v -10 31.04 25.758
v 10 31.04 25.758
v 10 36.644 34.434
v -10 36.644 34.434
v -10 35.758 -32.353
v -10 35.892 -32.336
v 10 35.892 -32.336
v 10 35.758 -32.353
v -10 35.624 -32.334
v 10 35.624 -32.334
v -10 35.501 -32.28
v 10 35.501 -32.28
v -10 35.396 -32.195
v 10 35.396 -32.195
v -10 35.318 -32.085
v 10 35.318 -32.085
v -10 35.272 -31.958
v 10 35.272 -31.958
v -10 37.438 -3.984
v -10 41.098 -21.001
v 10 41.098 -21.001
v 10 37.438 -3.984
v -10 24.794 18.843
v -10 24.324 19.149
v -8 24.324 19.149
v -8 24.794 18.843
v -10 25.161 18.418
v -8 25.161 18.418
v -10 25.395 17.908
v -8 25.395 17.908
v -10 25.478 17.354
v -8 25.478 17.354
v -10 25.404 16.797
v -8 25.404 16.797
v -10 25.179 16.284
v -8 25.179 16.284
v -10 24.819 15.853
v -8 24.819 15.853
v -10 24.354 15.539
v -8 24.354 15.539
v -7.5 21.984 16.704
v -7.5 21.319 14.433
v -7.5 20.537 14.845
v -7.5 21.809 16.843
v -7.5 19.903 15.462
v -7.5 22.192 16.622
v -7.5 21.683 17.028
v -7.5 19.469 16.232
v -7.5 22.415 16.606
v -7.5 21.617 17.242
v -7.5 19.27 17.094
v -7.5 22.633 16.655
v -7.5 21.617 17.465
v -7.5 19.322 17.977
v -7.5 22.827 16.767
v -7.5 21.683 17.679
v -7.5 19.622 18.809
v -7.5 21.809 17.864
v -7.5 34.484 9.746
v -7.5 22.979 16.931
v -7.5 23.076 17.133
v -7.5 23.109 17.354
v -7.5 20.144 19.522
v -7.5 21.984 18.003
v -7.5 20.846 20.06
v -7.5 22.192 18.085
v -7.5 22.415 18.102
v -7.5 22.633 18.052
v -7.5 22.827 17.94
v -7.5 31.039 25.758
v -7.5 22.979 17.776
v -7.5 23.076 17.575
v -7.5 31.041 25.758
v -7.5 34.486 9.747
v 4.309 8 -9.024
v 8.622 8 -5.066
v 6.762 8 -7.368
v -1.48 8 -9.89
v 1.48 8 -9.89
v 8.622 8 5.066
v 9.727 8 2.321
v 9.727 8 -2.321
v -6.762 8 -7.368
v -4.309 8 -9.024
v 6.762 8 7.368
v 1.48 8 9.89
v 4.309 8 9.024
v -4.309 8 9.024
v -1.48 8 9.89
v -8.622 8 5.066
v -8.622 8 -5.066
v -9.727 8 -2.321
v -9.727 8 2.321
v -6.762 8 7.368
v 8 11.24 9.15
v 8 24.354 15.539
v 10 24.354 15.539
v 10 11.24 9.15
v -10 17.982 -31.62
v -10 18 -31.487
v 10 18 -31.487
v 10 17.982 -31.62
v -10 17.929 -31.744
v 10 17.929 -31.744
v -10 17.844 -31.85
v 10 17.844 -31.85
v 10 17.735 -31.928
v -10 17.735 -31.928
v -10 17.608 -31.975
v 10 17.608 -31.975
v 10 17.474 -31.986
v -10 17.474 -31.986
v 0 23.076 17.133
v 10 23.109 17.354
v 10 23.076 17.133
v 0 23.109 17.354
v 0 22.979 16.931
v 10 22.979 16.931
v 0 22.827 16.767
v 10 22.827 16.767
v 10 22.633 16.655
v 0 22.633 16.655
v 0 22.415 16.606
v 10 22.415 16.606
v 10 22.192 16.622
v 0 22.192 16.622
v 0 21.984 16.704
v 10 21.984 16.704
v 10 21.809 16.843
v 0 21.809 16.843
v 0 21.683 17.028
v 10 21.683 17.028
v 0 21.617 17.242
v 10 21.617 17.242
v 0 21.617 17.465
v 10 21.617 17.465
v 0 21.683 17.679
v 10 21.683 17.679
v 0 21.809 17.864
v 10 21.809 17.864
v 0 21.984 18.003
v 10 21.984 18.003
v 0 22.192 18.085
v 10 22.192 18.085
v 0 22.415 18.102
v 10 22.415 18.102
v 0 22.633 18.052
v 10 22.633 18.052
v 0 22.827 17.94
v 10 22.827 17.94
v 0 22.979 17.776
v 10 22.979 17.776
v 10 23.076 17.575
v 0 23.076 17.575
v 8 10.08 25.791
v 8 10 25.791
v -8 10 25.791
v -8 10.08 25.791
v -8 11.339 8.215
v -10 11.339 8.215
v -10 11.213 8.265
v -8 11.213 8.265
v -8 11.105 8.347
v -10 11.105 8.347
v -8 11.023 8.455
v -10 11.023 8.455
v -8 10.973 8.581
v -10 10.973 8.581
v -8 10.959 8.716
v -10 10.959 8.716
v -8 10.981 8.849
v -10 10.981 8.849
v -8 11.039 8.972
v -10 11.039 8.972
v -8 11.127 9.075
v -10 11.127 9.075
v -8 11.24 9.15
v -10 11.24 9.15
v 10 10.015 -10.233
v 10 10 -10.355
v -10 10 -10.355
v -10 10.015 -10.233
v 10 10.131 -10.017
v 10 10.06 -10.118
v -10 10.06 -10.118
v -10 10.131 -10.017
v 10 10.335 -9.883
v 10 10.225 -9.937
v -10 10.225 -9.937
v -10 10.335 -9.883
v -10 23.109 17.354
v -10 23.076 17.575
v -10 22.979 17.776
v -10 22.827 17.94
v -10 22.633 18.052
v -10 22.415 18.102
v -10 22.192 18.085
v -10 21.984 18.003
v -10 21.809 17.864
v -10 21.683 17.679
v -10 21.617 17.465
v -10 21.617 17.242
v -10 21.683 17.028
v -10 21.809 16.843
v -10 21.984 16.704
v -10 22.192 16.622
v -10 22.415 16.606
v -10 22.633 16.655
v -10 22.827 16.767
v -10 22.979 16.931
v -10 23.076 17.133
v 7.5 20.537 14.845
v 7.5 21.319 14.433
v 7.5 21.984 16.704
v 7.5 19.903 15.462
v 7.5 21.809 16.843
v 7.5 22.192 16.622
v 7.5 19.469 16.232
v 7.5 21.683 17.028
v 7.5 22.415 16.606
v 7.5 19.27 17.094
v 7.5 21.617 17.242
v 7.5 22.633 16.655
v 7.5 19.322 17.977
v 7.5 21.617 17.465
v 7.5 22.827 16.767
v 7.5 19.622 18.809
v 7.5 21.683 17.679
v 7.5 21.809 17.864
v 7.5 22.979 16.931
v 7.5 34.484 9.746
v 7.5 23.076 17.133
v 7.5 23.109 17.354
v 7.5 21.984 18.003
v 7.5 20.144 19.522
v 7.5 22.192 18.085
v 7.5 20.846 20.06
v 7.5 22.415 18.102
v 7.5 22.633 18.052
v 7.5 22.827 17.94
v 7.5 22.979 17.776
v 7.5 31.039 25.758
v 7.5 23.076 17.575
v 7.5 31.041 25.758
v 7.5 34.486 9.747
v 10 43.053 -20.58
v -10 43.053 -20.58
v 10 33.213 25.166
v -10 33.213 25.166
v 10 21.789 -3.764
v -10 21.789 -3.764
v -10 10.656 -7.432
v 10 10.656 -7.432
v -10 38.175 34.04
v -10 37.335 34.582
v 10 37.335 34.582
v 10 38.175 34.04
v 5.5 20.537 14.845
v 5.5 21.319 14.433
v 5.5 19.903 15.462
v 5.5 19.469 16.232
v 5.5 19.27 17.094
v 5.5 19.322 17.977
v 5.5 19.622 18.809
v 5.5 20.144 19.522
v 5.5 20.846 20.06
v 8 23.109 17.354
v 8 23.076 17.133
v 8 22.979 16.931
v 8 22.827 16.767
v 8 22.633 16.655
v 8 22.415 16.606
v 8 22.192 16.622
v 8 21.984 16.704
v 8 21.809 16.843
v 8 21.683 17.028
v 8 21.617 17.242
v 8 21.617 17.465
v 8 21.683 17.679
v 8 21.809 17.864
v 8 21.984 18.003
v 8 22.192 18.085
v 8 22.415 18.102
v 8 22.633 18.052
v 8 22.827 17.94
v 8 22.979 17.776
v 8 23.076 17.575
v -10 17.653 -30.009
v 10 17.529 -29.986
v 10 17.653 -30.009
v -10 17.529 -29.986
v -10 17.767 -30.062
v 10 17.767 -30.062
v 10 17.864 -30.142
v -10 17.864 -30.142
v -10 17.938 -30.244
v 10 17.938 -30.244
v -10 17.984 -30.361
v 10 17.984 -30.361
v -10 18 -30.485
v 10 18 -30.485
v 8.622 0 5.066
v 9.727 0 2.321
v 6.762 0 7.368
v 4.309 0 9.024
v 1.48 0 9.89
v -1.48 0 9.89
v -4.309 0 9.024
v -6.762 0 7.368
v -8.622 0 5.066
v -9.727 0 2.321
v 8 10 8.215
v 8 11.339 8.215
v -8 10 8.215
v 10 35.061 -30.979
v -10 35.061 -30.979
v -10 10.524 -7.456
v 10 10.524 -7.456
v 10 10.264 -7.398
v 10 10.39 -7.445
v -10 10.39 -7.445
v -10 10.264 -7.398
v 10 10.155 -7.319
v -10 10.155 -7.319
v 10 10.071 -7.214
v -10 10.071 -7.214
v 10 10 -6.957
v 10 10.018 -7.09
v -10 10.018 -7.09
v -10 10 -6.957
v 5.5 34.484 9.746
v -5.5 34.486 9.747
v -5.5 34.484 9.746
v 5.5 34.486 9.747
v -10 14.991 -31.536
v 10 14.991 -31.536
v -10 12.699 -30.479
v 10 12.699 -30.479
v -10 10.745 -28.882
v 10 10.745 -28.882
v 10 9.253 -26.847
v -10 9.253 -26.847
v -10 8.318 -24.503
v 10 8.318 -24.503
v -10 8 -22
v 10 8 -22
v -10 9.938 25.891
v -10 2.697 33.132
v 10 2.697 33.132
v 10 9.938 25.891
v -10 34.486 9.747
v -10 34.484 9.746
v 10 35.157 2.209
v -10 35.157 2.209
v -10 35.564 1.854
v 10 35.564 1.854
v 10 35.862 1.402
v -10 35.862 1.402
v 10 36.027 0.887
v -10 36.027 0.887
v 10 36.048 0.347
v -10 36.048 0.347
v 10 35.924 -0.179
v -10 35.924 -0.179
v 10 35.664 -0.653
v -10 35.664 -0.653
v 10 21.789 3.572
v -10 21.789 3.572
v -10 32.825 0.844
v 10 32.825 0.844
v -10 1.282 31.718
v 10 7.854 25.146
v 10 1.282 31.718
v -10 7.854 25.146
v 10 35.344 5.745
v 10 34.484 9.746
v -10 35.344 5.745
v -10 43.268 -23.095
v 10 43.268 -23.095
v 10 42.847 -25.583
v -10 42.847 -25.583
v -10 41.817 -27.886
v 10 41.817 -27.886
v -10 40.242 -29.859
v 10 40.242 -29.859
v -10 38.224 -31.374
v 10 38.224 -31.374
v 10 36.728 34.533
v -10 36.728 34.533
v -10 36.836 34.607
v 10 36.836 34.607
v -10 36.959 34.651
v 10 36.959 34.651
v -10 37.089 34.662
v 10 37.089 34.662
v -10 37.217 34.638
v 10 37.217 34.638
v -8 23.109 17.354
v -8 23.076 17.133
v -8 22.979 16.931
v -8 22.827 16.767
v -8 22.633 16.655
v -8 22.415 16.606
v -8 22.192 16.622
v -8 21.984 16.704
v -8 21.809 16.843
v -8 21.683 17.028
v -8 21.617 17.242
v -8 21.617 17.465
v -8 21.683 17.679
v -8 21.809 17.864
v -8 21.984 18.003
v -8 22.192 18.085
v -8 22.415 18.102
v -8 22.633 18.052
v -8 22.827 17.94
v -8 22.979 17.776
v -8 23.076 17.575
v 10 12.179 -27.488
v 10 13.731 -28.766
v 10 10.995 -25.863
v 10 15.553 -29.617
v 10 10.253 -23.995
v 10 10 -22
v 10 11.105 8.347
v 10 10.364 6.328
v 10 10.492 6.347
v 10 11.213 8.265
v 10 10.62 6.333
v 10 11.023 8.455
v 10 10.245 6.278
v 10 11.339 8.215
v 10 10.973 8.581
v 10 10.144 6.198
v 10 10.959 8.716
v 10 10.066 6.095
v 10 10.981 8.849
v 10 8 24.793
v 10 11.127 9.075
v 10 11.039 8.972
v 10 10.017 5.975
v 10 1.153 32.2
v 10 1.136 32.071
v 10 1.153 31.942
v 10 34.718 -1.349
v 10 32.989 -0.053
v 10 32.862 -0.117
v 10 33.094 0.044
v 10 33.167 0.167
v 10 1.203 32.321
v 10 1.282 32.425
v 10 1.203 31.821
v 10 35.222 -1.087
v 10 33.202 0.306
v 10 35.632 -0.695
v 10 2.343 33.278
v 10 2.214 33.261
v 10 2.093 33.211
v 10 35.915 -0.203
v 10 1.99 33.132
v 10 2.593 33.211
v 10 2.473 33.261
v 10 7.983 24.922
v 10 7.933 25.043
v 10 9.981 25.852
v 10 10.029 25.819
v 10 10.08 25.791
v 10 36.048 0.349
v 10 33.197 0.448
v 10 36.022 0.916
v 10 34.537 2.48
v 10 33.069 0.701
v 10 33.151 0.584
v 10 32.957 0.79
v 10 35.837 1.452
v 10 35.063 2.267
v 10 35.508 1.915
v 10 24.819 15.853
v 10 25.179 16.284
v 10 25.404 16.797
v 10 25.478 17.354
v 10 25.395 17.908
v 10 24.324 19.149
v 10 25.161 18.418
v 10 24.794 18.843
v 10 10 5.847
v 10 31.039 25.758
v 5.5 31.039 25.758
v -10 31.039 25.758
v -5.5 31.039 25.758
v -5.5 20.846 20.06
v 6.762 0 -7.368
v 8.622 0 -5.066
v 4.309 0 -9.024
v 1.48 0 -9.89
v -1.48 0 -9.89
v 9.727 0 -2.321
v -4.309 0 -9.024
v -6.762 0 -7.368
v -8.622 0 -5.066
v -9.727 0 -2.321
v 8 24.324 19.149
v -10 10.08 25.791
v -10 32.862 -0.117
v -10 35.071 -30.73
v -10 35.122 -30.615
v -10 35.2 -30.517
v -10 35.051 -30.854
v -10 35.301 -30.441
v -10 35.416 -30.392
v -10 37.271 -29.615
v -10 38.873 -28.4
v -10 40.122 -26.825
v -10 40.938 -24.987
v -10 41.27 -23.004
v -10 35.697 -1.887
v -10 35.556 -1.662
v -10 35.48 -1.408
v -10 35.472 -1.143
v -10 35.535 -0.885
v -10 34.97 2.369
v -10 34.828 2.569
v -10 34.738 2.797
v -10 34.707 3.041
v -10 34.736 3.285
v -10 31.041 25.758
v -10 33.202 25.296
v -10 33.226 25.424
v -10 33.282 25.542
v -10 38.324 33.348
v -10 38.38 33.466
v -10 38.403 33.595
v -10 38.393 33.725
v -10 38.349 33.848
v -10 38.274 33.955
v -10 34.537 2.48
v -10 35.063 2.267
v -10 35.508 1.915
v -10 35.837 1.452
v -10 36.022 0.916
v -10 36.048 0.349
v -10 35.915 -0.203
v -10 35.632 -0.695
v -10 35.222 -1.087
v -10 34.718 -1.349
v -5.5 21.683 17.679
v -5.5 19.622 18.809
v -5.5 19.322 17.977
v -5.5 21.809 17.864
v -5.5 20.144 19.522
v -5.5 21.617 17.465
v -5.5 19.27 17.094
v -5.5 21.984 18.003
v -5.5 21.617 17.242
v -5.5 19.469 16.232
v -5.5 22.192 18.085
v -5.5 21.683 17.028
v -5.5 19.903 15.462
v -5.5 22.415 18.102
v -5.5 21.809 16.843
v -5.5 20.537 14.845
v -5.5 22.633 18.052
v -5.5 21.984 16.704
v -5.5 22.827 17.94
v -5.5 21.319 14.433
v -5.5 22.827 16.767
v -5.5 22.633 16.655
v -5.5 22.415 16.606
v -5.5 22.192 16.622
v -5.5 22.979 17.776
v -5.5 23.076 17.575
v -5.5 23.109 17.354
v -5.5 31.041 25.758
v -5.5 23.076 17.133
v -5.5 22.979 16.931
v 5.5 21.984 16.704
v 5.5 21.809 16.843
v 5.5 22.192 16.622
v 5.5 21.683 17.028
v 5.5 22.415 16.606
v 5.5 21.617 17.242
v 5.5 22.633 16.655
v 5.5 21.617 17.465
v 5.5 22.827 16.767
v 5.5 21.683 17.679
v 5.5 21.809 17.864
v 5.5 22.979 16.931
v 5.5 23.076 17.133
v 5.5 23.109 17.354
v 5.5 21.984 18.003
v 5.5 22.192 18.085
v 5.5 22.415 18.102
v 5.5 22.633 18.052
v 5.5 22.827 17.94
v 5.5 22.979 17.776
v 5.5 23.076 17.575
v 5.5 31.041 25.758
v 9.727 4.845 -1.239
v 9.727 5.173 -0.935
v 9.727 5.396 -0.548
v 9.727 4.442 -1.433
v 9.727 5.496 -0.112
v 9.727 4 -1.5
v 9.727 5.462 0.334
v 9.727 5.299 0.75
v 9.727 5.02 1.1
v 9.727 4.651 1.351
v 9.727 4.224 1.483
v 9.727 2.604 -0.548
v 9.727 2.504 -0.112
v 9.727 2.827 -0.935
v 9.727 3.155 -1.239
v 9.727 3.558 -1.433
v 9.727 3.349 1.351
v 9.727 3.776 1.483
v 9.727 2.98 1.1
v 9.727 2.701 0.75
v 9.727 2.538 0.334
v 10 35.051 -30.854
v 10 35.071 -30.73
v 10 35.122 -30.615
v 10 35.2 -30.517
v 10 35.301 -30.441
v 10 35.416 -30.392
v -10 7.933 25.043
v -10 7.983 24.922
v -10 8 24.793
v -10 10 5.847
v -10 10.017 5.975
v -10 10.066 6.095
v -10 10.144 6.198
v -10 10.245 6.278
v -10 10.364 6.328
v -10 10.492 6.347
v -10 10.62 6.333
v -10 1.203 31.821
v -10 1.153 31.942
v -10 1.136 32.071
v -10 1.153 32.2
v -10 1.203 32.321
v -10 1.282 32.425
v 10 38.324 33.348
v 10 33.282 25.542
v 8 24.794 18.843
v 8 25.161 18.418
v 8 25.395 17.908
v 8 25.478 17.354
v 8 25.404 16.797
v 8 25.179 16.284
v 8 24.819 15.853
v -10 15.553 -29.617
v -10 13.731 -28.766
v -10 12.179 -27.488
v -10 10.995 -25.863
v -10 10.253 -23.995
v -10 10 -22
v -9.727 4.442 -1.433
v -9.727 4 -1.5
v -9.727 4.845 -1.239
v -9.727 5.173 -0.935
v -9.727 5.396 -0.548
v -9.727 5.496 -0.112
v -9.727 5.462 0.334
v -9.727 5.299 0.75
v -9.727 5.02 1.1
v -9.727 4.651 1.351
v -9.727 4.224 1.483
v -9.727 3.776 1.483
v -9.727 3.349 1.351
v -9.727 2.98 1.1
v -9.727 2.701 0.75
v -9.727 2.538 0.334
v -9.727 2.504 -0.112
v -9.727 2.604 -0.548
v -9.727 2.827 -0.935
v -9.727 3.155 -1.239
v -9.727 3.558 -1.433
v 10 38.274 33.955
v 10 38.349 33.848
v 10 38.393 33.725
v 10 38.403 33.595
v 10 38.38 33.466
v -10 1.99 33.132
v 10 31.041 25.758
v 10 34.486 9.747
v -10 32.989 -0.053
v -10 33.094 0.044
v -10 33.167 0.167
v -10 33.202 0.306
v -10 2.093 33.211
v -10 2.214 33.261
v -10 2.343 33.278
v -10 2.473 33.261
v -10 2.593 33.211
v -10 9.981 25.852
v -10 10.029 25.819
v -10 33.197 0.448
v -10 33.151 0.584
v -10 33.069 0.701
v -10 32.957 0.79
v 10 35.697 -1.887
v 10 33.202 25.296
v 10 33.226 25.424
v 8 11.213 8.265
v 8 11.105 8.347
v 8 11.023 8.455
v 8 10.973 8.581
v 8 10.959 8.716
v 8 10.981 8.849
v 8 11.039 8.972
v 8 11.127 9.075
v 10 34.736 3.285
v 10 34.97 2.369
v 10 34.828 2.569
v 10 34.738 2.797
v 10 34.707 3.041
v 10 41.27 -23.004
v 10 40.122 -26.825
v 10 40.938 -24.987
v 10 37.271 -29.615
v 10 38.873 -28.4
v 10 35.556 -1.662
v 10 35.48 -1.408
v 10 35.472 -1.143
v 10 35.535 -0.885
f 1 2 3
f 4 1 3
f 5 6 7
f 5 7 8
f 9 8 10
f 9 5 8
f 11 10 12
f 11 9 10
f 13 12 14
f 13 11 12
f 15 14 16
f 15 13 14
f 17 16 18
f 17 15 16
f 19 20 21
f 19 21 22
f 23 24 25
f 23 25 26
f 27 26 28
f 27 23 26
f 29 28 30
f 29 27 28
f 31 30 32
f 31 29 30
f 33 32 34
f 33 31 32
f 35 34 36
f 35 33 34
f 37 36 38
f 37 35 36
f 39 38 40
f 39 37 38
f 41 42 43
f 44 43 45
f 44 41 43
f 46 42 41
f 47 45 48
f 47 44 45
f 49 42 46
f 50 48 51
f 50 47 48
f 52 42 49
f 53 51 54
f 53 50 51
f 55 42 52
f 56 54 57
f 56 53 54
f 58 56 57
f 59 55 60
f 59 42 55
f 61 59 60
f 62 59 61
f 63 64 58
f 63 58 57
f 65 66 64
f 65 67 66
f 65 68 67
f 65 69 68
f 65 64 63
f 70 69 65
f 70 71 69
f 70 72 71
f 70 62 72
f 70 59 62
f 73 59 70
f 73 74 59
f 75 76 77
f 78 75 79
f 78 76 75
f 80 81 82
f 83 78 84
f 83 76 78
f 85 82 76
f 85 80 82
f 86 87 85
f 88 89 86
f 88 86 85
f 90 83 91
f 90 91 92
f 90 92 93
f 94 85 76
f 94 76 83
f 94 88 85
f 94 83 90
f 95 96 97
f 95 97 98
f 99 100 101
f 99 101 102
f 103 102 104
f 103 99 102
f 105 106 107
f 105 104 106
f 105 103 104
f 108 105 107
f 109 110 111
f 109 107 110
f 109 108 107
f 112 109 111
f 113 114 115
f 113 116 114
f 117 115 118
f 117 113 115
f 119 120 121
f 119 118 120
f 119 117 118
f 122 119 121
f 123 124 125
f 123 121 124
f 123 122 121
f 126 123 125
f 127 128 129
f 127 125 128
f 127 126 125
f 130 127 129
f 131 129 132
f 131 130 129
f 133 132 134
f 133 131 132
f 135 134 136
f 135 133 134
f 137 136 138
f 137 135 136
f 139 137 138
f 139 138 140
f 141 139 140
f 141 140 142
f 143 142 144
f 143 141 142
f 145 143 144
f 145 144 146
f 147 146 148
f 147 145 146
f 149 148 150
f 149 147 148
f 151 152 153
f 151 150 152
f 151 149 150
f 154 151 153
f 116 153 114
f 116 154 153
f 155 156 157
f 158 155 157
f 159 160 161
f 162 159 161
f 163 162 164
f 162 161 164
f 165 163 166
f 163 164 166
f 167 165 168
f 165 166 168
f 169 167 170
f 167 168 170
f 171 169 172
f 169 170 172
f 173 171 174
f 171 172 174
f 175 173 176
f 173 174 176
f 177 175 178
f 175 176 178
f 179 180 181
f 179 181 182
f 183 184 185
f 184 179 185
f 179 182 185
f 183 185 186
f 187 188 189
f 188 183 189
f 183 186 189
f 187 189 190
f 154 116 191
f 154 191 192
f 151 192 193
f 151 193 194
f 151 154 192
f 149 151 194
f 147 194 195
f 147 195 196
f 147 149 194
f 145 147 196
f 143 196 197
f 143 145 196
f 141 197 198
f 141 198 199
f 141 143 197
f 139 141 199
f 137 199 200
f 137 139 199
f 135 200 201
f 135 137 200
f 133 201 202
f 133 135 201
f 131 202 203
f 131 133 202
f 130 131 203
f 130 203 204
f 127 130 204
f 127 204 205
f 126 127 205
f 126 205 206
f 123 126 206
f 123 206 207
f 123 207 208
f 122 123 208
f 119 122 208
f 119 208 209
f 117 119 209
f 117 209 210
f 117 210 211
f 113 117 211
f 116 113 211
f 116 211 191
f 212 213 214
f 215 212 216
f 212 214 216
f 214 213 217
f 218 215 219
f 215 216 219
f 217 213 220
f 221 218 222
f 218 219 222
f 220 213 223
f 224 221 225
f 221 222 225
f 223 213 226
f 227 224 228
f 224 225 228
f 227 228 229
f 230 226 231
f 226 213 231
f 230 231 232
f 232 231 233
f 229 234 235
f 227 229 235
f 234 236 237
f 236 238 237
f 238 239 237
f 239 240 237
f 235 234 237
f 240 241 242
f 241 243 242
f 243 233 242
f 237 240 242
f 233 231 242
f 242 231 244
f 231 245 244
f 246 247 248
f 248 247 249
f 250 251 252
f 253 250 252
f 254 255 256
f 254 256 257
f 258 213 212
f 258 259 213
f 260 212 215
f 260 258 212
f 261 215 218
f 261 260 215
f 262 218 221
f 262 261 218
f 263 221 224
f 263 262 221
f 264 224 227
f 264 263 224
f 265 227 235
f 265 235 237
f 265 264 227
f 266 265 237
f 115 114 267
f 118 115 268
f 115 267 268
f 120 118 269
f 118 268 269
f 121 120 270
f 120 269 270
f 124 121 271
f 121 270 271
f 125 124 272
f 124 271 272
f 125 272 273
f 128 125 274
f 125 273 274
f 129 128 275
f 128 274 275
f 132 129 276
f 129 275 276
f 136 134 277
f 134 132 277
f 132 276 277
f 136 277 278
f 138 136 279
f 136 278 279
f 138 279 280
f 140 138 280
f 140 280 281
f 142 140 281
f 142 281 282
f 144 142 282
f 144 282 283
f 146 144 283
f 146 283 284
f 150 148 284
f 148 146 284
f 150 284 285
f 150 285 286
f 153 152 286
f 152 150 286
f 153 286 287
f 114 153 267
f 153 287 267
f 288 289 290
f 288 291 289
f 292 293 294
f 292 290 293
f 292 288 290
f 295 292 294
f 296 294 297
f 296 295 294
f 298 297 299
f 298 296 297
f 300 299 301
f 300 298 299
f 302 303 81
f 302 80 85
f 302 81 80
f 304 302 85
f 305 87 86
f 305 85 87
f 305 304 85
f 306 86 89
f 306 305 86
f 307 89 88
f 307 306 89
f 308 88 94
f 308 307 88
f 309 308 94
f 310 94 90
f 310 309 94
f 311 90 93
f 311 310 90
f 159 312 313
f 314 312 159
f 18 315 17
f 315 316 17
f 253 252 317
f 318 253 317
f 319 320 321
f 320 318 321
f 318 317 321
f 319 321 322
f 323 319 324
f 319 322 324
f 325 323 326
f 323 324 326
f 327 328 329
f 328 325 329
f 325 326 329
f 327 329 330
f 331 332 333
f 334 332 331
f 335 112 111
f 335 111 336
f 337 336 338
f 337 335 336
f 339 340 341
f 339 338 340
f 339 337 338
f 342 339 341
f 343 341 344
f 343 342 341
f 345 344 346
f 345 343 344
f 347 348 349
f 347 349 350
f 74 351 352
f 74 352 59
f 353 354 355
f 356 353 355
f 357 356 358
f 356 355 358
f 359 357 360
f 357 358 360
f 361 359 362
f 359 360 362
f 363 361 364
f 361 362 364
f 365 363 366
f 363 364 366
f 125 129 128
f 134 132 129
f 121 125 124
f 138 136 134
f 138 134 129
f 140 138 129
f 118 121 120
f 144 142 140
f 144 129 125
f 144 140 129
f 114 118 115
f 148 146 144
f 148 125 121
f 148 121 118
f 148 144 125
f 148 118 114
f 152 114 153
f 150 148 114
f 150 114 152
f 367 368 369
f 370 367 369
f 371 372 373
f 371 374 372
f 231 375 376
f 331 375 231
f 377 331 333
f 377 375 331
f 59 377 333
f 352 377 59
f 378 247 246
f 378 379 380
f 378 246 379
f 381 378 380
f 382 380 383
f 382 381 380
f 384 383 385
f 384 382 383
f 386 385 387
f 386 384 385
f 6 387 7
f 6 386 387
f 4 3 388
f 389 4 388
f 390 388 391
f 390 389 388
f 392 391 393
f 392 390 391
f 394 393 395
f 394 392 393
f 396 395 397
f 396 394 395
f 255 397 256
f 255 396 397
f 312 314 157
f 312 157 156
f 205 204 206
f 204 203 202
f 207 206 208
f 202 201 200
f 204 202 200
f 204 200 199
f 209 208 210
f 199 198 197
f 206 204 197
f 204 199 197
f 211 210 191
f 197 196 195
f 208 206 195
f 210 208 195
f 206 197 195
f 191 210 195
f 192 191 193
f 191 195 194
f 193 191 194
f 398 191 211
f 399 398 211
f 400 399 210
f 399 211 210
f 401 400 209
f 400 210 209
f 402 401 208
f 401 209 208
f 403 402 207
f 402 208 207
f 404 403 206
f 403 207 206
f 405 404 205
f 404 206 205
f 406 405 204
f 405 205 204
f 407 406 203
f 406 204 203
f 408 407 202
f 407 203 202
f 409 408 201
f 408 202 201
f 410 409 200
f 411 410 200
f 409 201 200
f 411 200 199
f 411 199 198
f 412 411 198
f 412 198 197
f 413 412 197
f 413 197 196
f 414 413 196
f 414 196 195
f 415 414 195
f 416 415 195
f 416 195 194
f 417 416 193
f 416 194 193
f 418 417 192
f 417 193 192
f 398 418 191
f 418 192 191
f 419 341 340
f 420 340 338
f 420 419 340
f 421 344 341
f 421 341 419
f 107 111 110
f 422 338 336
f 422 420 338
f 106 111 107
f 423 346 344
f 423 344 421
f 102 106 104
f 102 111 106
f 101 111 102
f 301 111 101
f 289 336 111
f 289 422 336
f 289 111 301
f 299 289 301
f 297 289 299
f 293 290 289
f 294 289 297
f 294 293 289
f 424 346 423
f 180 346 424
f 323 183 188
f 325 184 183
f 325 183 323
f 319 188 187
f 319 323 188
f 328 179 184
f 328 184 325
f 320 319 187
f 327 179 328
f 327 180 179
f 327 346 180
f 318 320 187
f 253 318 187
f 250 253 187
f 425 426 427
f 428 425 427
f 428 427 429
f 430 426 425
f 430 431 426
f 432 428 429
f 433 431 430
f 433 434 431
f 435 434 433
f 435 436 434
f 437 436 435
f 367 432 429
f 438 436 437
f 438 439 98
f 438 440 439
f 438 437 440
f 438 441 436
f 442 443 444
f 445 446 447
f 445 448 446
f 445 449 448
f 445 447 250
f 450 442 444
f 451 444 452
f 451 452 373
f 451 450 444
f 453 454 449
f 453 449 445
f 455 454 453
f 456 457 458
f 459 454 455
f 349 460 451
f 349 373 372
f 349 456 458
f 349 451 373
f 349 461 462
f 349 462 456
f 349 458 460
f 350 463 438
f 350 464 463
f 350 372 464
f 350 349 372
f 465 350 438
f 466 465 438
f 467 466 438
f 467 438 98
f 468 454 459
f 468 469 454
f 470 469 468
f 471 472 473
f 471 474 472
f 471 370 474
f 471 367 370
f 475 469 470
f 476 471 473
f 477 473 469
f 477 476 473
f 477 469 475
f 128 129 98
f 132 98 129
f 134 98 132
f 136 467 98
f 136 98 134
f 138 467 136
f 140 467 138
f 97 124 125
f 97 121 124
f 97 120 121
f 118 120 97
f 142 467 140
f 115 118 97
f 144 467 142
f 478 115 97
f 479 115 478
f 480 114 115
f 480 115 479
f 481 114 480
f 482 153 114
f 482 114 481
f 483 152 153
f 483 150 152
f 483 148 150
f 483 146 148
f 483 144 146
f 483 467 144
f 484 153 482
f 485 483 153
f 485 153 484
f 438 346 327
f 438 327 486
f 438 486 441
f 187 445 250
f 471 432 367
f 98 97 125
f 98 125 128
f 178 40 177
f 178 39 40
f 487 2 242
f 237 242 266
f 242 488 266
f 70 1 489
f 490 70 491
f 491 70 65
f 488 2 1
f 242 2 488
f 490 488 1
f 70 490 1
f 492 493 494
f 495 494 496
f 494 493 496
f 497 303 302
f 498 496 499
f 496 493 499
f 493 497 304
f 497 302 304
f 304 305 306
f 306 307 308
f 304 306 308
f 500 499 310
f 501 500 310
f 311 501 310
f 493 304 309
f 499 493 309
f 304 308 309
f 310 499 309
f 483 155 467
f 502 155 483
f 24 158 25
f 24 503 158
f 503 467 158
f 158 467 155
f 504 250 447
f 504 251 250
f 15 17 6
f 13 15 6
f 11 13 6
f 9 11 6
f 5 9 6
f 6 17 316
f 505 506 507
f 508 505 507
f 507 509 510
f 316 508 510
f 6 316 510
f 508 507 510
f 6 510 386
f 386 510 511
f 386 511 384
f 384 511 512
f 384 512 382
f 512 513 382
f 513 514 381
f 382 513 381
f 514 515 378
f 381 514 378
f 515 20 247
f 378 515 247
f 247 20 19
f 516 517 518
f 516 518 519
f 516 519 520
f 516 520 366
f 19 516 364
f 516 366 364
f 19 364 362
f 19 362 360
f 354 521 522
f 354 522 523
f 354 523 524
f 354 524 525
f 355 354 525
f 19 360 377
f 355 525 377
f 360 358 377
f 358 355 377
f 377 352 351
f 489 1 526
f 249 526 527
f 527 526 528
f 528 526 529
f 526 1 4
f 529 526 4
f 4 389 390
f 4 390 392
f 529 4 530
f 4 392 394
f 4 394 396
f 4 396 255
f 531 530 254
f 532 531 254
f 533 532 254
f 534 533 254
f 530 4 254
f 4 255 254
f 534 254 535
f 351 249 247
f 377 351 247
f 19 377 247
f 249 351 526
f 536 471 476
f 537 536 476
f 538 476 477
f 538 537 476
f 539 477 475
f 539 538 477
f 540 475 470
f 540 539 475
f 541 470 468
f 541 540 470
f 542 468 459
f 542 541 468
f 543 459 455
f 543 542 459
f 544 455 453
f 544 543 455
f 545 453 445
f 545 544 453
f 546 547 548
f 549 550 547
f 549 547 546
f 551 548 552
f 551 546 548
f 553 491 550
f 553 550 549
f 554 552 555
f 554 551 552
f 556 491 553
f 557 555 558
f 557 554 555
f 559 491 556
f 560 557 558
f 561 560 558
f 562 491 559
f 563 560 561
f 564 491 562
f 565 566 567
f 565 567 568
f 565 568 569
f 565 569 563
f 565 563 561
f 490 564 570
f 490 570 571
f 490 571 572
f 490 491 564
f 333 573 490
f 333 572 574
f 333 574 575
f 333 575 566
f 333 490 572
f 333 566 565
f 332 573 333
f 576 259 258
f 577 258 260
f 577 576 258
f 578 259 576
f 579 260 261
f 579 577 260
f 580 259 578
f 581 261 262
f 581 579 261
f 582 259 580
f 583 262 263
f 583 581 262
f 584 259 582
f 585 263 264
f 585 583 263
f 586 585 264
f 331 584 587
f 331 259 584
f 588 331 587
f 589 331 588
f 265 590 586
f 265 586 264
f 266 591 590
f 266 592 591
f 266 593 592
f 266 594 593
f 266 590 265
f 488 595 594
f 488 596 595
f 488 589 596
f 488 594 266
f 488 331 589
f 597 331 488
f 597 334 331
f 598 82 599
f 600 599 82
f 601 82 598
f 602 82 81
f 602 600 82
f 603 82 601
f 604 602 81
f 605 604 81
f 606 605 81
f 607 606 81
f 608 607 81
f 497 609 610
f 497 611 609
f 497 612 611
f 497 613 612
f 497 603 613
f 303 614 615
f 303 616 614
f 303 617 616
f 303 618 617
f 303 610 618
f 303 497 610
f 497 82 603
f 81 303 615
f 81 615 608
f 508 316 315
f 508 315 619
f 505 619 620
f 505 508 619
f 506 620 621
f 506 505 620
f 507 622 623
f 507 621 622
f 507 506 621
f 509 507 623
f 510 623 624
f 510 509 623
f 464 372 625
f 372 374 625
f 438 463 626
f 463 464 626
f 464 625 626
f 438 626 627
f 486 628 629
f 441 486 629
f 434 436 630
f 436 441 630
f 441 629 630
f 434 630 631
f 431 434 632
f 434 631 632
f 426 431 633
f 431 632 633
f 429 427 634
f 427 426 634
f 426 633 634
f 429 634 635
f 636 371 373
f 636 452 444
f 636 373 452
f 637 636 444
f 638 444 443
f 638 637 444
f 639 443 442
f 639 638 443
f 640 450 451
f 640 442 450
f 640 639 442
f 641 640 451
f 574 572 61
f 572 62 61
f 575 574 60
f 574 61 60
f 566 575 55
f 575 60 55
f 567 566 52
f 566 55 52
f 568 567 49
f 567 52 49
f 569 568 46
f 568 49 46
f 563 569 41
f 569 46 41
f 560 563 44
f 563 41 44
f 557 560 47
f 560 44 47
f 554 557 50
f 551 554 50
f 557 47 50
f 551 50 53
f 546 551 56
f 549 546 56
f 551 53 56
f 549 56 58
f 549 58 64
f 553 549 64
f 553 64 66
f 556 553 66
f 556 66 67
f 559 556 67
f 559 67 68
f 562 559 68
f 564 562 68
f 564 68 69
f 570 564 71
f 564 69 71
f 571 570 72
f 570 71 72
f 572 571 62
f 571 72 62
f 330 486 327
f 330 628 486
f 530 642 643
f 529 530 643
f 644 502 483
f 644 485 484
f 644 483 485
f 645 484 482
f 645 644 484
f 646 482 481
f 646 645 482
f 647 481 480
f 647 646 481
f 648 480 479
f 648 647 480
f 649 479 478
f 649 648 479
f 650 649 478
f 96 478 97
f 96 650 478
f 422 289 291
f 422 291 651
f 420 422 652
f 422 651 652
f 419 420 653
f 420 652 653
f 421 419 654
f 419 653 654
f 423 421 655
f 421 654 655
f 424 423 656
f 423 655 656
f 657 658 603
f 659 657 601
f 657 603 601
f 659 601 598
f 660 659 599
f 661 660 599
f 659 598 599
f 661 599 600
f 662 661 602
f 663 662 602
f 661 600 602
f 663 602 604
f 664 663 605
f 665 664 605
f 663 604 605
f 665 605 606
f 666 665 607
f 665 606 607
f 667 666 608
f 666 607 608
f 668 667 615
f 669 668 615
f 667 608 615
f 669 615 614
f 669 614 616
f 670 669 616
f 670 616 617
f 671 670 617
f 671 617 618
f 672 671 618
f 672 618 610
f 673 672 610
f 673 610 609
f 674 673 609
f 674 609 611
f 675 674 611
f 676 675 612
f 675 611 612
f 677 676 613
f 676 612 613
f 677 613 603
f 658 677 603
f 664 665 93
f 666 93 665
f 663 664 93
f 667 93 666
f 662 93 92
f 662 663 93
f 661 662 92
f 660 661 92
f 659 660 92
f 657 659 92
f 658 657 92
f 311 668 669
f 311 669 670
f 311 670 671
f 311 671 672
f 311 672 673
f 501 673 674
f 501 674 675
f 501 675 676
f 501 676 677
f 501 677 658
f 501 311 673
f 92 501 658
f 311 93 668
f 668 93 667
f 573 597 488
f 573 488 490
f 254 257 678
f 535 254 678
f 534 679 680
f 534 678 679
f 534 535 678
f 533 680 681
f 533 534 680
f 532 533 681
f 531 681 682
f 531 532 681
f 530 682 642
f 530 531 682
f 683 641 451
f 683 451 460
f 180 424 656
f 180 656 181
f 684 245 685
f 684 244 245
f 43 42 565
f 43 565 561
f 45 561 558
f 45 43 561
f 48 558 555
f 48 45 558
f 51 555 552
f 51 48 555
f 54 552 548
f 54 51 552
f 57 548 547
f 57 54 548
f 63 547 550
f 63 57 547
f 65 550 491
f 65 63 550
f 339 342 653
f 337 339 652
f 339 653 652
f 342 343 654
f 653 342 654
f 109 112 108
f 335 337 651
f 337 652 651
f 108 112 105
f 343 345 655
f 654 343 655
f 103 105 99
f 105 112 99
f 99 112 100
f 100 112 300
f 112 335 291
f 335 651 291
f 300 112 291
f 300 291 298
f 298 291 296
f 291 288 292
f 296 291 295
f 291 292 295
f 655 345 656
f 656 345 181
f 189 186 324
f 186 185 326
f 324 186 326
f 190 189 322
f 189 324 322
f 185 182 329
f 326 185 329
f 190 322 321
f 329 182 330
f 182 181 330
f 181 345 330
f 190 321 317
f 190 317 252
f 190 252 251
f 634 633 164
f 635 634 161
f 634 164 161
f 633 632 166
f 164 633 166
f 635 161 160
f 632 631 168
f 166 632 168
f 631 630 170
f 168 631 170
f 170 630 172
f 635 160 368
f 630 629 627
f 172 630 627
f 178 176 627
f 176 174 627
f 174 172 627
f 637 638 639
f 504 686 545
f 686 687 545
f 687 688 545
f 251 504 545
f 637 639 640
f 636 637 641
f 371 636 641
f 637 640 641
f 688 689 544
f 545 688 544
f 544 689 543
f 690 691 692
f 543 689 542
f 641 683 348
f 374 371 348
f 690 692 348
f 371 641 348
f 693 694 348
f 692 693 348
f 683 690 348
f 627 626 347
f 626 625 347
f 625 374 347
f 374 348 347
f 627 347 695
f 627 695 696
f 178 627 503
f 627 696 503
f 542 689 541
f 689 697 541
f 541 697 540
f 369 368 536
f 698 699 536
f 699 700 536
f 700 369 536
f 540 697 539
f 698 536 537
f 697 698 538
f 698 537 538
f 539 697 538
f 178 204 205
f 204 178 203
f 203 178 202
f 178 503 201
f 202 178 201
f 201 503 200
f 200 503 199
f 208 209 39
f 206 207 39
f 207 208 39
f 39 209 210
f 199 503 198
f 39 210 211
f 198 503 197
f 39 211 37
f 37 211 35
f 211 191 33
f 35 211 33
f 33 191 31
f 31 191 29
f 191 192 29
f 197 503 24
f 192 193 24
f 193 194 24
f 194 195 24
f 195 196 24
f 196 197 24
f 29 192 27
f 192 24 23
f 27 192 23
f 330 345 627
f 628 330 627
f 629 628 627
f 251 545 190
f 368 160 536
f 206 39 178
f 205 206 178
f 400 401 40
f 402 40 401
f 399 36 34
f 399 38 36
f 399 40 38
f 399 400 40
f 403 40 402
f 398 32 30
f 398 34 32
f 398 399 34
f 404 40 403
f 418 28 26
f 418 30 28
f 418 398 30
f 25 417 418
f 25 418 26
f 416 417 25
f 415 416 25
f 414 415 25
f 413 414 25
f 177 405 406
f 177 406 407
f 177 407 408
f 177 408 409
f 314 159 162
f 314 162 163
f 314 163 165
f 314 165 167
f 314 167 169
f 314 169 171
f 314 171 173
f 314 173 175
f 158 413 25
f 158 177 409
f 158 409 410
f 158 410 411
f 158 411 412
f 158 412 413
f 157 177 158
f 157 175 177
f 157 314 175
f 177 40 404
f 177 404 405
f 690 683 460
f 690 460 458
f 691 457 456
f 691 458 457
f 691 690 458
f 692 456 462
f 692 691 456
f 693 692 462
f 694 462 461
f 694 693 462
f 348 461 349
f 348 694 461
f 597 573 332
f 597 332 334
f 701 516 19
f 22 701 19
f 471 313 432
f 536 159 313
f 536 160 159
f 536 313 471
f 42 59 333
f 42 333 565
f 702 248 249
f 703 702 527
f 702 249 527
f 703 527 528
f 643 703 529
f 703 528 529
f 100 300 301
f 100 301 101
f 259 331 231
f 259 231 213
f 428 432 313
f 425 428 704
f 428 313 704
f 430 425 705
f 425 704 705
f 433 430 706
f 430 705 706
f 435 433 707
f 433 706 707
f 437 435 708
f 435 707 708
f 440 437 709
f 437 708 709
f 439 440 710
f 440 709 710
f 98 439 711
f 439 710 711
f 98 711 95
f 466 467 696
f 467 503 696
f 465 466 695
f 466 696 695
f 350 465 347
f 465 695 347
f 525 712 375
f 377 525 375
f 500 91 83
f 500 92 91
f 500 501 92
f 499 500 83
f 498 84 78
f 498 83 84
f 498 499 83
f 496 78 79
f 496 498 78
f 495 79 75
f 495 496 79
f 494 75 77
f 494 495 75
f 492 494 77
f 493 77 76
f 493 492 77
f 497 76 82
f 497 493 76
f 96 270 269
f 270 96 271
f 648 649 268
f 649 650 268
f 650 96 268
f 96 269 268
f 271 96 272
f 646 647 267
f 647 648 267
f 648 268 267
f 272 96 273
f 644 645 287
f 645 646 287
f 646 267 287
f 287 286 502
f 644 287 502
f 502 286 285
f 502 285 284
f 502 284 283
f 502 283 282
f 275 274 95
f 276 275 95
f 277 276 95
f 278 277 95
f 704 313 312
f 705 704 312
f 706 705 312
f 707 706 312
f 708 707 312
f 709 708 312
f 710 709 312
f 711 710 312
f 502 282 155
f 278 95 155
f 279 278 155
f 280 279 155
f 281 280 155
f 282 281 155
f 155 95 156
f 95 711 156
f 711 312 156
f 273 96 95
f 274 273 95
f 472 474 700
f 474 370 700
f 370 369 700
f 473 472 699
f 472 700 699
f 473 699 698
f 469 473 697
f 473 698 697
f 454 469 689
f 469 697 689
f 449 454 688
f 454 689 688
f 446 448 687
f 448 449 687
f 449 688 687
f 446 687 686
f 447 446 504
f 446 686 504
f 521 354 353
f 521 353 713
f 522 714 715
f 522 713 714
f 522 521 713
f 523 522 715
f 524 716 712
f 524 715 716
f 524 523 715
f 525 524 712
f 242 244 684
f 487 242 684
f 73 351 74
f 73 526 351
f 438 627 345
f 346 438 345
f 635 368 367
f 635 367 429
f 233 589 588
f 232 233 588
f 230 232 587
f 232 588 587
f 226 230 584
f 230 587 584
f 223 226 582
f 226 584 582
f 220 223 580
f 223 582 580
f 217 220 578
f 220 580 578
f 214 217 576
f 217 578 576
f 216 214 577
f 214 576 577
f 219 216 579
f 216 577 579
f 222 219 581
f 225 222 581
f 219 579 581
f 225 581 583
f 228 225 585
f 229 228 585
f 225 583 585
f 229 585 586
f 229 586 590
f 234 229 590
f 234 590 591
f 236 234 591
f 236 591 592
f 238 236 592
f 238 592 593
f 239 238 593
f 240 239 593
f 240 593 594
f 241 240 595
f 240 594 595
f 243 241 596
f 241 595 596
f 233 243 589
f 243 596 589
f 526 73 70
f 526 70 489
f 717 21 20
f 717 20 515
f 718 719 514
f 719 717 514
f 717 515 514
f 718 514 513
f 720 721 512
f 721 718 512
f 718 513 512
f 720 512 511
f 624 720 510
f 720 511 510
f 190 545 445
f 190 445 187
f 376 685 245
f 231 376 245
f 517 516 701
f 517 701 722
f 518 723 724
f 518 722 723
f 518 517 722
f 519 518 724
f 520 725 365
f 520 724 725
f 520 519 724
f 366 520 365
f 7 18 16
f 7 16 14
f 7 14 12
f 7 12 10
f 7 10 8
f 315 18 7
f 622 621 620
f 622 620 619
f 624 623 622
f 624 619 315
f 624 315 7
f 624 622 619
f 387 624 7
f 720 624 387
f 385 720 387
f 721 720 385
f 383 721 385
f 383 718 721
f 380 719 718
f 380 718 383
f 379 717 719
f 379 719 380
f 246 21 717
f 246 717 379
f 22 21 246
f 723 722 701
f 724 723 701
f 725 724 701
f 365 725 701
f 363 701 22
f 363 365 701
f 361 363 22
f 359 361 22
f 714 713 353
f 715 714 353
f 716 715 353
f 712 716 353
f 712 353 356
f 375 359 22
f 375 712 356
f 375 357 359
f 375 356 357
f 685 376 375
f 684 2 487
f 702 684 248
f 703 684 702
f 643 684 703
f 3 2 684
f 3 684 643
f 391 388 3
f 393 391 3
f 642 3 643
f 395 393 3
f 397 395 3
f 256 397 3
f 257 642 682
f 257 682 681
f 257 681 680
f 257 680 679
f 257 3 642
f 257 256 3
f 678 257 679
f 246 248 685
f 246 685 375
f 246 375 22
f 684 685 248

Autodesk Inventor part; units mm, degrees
ref_plane "YZ Plane" through (0, 0, 0) normal (1, 0, 0) x (0, 1, 0)
ref_plane "XZ Plane" through (0, 0, 0) normal (0, 1, 0) x (-1, 0, 0)
ref_plane "XY Plane" through (0, 0, 0) normal (0, 0, 1) x (1, 0, 0)
sketch "Эскиз1" plane through (0, 0, 0) normal (1, 0, 0) x (0, 0, -1)
  line L0 (-5.1487, -13.4444) -> (-9.7487, -13.4444)
  line L1 (-9.7487, -13.4444) -> (-9.7487, -18.4444)
  line L2 (-9.7487, -18.4444) -> (7.2513, -18.4444)
  line L3 (7.2513, -18.4444) -> (7.2513, -13.4444)
  line L4 (7.2513, -13.4444) -> (2.6513, -13.4444)
  line L5 (2.6513, -13.4444) -> (2.6513, -8.4651)
  line L6 (2.6513, -8.4651) -> (7.2513, -8.4651)
  line L7 (7.2513, -8.4651) -> (7.2513, 21.5556)
  line L8 (7.2513, 21.5556) -> (-9.7487, 21.5556)
  line L9 (-9.7487, 21.5556) -> (-9.7487, -8.4237)
  line L10 (-9.7487, -8.4237) -> (-5.1487, -8.4237)
  line L11 (-5.1487, -8.4237) -> (-5.1487, -13.4444)
  circle A0 centre (-1.2487, 17.5556) radius 1
  dimension "d13" = 0.5
sketch "Эскиз2" plane through (0, 0, 0) normal (0, 1, 0) x (-1, 0, 0)
  line L0 (-9.727, -2.3208) -> (-9.727, 2.3208)
  line L1 (9.727, 2.3208) -> (9.727, -2.3208)
  arc A0 (9.727, 2.3208) -> (-9.727, 2.3208) centre (0, 0) ccw
  arc A1 (-9.727, -2.3208) -> (9.727, -2.3208) centre (0, 0) ccw
extrude "Выдавливание2" add sketch "Эскиз2" along normal blind 8
sketch "Эскиз3" plane through (0, 0, 0) normal (1, 0, 0) x (0, 1, 0)
  line L0 (7.8536, 25.1464) -> (1.2825, 31.7175)
  line L1 (1.2825, 32.4246) -> (1.9896, 33.1317)
  line L2 (2.6967, 33.1317) -> (9.9377, 25.8908)
  arc A0 (8, -22) -> (17.4737, -31.9861) centre (18, -22) ccw
  line L3 (8, 24.7929) -> (8, -22)
  line L4 (10, -22) -> (10, -10.3547)
  arc A1 (10, -22) -> (17.5294, -29.9861) centre (18, -22) ccw
  line L5 (18, -30.4853) -> (18, -31.4868)
  line L6 (10.0799, 25.7912) -> (24.3236, 19.1492)
  line L7 (24.3542, 15.5386) -> (11.2398, 9.1501)
  arc A2 (24.3542, 15.5386) -> (24.3236, 19.1492) centre (23.4783, 17.3366) ccw
  line L8 (11.3388, 8.2152) -> (34.5374, 2.4804)
  line L9 (34.7181, -1.3488) -> (10.3348, -9.8828)
  arc A3 (34.7181, -1.3488) -> (34.5374, 2.4804) centre (34.0574, 0.5389) ccw
  line L10 (21.7887, 3.5717) -> (32.825, 0.8435)
  line L11 (21.7887, 3.5717) -> (10.62, 6.3327)
  line L12 (21.7887, -3.7645) -> (10.6564, -7.4318)
  line L13 (21.7887, -3.7645) -> (32.8615, -0.1167)
  line L14 (10, 5.8473) -> (10, -6.957)
  arc A4 (32.8615, -0.1167) -> (32.825, 0.8435) centre (32.7051, 0.3582) ccw
  circle A5 centre (22.3591, 17.3536) radius 0.75
  arc A6 (1.2825, 32.4246) -> (1.2825, 31.7175) centre (1.636, 32.0711) ccw
  arc A7 (2.6967, 33.1317) -> (1.9896, 33.1317) centre (2.3431, 32.7782) ccw
  arc A8 (8, 24.7929) -> (7.8536, 25.1464) centre (7.5, 24.7929) ccw
  arc A9 (9.9377, 25.8908) -> (10.0799, 25.7912) centre (10.2912, 26.2443) ccw
  arc A10 (11.2398, 9.1501) -> (11.3388, 8.2152) centre (11.4588, 8.7006) ccw
  arc A11 (10.62, 6.3327) -> (10, 5.8473) centre (10.5, 5.8473) ccw
  arc A12 (10, -6.957) -> (10.6564, -7.4318) centre (10.5, -6.957) ccw
  arc A13 (10.3348, -9.8828) -> (10, -10.3547) centre (10.5, -10.3547) ccw
  arc A14 (18, -30.4853) -> (17.5294, -29.9861) centre (17.5, -30.4853) ccw
  arc A15 (17.4737, -31.9861) -> (18, -31.4868) centre (17.5, -31.4868) ccw
  point P0 (0, 0)
  point P1 (18, -32)
  point P2 (18, -30)
  dimension "d13" = 0.5
extrude "Выдавливание3" add sketch "Эскиз3" along normal mid plane 20 separate body
sketch "Эскиз4" plane through (-10, 10, -6.957) normal (0, 1, 0) x (1, 0, 0)
  line L0 (18, -32.7481) -> (2, -32.7481)
  line L1 (2, -15.1722) -> (2, -32.7481)
  line L2 (18, -15.1722) -> (18, -32.7481)
  line L3 (18, -15.1722) -> (2, -15.1722)
  point P0 (10, -6.957)
extrude "Выдавливание4" cut sketch "Эскиз4" along normal blind 20 bodies 1 2
sketch "Эскиз5" plane through (0, 0, 0) normal (1, 0, 0) x (0, 1, 0)
  arc A0 (35.6637, -0.6527) -> (35.1571, 2.2094) centre (34.0574, 0.5389) ccw
  arc A1 (35.4164, -30.3921) -> (41.098, -21.0011) centre (33.2769, -22.6835) ccw
  arc A2 (35.4164, -30.3921) -> (35.0614, -30.979) centre (35.5502, -30.8739) ccw
  line L0 (35.0614, -30.979) -> (35.272, -31.9582)
  arc A3 (35.272, -31.9582) -> (35.8915, -32.3356) centre (35.7608, -31.853) ccw
  arc A4 (35.8915, -32.3356) -> (43.0533, -20.5805) centre (33.2769, -22.6835) ccw
  arc A5 (33.2815, 25.5424) -> (33.2127, 25.166) centre (33.7015, 25.2711) ccw
  line L1 (38.3237, 33.3484) -> (33.2815, 25.5424)
  arc A6 (38.3237, 33.3484) -> (38.175, 34.0397) centre (37.9037, 33.6197) ccw
  line L2 (37.335, 34.5823) -> (38.175, 34.0397)
  arc A7 (37.335, 34.5823) -> (36.6437, 34.4336) centre (37.0637, 34.1623) ccw
  line L3 (31.0396, 25.7578) -> (36.6437, 34.4336)
  line L4 (43.0533, -20.5805) -> (33.2127, 25.166)
  arc A8 (20.8463, 20.0597) -> (21.3193, 14.4329) centre (22.3591, 17.3536) ccw
  line L5 (34.4838, 9.7464) -> (21.3193, 14.4329)
  line L6 (31.0396, 25.7578) -> (20.8463, 20.0597)
  line L7 (35.6973, -1.8871) -> (37.4375, -3.9843)
  line L8 (34.7362, 3.2847) -> (35.3445, 5.7454)
  line L9 (41.098, -21.0011) -> (37.4375, -3.9843)
  line L10 (35.3445, 5.7454) -> (34.4838, 9.7464)
  arc A9 (35.6637, -0.6527) -> (35.6973, -1.8871) centre (36.4668, -1.2485) ccw
  arc A10 (34.7362, 3.2847) -> (35.1571, 2.2094) centre (35.707, 3.0447) ccw
  circle A11 centre (22.3591, 17.3536) radius 0.75
extrude "Выдавливание5" add sketch "Эскиз5" along normal mid plane 20 separate body
sketch "Эскиз6" plane through (-10, 35.3445, 5.7454) normal (0, -0.9776, -0.2103) x (1, 0, 0)
  line L0 (10, 1.8161) -> (10, 24.3613) construction
  line L1 (2.5, 20.4701) -> (0, 20.4701)
  line L2 (0, 4.0925) -> (2.5, 4.0925)
  line L3 (2.5, 4.0925) -> (2.5, 20.4701)
  line L4 (17.5, 20.4701) -> (20, 20.4701)
  line L5 (20, 4.0925) -> (17.5, 4.0925)
  line L6 (17.5, 4.0925) -> (17.5, 20.4701)
  line L7 (0, 20.4701) -> (0, 4.0925)
  line L8 (20, 4.0925) -> (20, 20.4701)
  line L9 (0, 19.7881) -> (20, 19.7881) projected
  line L10 (15.5, 20.4701) -> (4.5, 20.4701)
  line L11 (4.5, 20.4701) -> (4.5, 4.0925)
  line L12 (4.5, 4.0925) -> (15.5, 4.0925)
  line L13 (15.5, 4.0925) -> (15.5, 20.4701)
extrude "Выдавливание6" cut sketch "Эскиз6" along normal blind 20 bodies 3
sketch "Эскиз7" plane through (0, 0, 0) normal (1, 0, 0) x (0, 1, 0)
  circle A0 centre (22.3591, 17.3536) radius 0.75 projected
  point P0 (0, 0)
extrude "Выдавливание7" add sketch "Эскиз7" along normal mid plane 20 separate body
sketch "Эскиз8" plane through (9.727, 0, 2.3208) normal (1, 0, 0) x (0, 0, -1)
  circle A0 centre (2.3208, 4) radius 1.5
extrude "Выдавливание8" cut sketch "Эскиз8" against normal blind 20 bodies 1
properties part number "В. шарн. - держатель смартфона"
